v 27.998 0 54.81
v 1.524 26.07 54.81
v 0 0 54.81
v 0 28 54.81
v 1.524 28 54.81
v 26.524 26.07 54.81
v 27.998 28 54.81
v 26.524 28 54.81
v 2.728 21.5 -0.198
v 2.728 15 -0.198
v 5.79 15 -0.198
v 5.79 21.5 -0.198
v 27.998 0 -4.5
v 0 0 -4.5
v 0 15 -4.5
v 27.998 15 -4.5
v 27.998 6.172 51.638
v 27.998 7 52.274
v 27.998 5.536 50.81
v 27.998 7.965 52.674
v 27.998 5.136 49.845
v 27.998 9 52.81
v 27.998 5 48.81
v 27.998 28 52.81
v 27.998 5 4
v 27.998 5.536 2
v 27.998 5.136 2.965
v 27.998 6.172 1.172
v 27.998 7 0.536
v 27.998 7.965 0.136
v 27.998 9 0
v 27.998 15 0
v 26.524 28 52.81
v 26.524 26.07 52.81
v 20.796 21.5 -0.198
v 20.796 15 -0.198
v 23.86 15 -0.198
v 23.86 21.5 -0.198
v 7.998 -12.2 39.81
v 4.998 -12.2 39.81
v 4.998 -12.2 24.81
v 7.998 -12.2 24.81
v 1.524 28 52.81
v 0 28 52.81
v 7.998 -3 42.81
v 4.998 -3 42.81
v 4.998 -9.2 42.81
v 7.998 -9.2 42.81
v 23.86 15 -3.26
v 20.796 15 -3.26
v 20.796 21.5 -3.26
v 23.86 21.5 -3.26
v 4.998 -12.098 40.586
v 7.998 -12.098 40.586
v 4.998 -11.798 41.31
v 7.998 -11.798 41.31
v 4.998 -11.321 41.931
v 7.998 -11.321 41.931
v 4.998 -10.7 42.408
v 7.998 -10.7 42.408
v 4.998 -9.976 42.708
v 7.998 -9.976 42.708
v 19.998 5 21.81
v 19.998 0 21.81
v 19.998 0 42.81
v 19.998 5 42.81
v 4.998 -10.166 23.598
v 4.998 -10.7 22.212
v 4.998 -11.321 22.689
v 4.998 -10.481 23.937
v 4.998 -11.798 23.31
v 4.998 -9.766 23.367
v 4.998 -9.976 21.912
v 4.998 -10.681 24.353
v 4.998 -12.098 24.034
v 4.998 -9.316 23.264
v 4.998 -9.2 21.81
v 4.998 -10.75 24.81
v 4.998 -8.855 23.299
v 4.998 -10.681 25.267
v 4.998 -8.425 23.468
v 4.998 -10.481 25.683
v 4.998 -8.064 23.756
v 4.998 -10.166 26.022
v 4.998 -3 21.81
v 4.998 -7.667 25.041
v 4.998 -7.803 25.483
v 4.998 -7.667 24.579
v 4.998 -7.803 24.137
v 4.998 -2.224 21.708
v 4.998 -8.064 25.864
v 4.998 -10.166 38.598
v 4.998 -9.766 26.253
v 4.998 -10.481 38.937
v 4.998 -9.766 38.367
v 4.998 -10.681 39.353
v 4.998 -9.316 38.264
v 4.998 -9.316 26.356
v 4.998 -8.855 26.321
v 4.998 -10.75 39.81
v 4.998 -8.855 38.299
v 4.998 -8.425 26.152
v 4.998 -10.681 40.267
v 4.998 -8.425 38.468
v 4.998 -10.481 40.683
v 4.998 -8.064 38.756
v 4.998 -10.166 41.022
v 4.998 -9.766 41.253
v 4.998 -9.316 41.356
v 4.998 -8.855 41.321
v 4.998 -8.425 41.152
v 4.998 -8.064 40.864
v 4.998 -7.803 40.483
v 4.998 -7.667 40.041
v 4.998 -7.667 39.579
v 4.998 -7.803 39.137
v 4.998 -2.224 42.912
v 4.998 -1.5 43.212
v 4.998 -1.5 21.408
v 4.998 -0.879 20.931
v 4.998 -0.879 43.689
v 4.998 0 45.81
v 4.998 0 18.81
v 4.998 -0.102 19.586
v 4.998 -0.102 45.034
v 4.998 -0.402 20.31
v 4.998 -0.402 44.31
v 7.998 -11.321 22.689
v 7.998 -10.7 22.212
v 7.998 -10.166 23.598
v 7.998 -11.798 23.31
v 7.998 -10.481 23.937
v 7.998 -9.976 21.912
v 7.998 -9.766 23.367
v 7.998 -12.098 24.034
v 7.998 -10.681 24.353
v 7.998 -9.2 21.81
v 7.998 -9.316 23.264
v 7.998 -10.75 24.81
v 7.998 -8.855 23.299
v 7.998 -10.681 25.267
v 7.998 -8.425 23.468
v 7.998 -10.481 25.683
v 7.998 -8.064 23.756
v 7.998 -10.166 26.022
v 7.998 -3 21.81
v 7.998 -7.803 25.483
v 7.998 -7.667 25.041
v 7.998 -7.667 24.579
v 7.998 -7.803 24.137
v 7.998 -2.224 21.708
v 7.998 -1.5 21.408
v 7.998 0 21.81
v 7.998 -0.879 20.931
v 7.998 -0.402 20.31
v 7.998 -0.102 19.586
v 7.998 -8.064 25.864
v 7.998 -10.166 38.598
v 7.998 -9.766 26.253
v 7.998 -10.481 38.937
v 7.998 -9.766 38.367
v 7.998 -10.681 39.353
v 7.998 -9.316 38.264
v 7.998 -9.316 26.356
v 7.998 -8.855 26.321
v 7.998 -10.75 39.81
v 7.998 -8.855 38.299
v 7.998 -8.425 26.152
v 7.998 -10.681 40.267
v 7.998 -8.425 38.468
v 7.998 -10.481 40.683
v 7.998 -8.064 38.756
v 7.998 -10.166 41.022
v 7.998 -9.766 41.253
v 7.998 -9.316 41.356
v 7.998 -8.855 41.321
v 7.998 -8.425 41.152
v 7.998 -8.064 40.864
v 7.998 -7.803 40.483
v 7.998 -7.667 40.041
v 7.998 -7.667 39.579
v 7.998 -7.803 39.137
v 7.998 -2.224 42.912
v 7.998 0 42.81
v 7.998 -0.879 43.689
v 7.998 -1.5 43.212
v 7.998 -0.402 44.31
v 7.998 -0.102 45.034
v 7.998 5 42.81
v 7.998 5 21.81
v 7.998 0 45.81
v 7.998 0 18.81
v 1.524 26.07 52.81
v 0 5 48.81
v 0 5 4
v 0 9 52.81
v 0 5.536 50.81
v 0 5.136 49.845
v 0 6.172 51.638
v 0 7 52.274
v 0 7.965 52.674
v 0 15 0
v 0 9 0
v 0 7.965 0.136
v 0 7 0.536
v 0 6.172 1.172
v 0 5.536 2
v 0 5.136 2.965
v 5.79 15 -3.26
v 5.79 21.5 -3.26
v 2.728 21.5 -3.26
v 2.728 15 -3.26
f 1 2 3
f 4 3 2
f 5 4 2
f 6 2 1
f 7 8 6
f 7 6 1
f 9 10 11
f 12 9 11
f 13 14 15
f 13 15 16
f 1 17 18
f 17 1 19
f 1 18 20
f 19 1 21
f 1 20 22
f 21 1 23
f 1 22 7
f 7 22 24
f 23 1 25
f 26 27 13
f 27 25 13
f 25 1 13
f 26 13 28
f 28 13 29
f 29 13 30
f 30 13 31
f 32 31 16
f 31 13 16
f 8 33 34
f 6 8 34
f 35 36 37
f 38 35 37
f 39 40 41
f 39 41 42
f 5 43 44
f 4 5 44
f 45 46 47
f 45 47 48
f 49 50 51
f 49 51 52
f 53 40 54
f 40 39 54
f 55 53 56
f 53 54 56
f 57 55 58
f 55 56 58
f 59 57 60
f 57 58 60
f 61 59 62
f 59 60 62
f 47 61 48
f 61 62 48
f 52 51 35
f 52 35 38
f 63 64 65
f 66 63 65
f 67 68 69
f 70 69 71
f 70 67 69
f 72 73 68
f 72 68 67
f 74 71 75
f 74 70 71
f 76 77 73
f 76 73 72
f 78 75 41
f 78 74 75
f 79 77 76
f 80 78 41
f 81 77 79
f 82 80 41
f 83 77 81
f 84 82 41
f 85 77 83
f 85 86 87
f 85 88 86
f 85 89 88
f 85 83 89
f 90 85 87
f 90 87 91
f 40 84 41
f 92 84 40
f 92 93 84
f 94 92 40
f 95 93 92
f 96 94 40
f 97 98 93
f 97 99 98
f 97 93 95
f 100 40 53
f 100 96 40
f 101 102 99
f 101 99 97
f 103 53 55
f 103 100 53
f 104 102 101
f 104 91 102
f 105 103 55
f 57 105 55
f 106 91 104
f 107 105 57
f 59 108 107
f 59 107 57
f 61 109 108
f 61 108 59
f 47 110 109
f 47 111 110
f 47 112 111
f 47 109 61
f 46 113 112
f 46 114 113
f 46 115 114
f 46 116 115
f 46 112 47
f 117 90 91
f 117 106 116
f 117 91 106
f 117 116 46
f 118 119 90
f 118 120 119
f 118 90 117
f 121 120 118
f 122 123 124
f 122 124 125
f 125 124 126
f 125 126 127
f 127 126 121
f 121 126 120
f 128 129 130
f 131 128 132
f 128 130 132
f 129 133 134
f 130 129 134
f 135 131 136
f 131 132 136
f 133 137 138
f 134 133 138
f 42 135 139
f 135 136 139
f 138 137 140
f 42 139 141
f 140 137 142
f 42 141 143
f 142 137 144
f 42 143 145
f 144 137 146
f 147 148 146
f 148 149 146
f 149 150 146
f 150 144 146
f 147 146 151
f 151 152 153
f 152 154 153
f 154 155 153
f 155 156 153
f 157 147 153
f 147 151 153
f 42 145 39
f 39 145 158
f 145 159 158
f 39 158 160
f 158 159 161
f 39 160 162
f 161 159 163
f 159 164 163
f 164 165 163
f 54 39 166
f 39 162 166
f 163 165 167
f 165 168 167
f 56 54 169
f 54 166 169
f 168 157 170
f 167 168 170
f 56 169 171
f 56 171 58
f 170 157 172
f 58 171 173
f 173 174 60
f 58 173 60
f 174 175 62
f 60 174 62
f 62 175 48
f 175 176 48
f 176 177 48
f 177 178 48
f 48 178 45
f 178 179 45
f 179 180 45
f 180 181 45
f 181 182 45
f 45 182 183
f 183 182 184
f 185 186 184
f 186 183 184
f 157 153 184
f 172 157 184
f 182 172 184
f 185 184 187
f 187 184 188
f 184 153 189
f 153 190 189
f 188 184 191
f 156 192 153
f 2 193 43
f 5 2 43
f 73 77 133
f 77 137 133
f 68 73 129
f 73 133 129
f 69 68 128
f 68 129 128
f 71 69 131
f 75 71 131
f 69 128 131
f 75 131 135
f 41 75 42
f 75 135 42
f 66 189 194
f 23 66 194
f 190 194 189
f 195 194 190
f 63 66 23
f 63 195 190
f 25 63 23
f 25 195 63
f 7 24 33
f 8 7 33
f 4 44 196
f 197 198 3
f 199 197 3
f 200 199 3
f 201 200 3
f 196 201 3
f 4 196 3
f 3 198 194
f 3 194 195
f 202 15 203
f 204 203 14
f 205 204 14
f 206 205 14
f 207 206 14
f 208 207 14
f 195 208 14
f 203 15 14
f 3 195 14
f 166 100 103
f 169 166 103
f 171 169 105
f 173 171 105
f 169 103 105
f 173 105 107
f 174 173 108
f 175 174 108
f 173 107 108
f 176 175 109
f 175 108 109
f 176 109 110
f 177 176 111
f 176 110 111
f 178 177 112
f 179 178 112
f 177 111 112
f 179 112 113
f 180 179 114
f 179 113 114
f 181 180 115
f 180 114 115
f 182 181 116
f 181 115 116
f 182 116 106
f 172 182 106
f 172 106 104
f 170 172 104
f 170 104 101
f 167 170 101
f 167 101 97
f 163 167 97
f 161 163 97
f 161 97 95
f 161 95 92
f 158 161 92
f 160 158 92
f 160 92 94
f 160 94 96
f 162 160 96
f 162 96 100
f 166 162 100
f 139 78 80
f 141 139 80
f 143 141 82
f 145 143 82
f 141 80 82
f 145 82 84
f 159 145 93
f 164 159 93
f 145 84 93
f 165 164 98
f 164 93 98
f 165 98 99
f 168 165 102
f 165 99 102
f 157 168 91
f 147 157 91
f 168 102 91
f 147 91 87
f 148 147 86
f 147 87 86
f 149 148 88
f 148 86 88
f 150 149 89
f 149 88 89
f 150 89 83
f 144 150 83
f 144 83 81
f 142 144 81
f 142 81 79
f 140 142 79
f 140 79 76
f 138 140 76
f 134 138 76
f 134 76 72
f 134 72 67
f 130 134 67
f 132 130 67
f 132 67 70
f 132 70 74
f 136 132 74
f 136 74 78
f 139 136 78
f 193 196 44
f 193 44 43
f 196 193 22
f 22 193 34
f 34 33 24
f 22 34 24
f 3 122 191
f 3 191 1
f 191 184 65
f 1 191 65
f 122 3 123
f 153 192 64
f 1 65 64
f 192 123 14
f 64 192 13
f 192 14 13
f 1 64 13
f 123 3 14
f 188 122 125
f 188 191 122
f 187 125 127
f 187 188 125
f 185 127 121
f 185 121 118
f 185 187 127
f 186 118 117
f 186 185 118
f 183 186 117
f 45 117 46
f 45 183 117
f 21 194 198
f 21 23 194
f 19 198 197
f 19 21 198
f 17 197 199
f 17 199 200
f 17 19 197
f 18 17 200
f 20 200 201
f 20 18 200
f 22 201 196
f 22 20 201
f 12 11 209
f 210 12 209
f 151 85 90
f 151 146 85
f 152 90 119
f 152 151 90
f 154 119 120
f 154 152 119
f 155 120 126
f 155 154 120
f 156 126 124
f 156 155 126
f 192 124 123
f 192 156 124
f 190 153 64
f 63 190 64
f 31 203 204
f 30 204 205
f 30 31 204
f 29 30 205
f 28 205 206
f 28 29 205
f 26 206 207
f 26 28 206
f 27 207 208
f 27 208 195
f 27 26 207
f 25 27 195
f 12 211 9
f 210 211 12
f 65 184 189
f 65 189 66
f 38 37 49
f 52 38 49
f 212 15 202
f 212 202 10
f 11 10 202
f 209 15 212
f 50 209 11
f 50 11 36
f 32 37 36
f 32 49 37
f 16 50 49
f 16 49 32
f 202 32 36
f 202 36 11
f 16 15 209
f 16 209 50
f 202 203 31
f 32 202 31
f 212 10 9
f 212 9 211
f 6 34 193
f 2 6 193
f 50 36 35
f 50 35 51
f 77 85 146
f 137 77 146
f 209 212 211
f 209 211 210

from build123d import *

# Parameters (mm, degrees)
SKETCH1_W           = 27.99800038
SKETCH1_H           = 4.5
BOSS_EXTRUDE2_DEPTH = 15
SKETCH2_W           = 27.99800038
SKETCH2_H           = 5
BOSS_EXTRUDE3_DEPTH = 52.81000038
FILLET1_R           = 4
SKETCH3_W           = 27.99800038
SKETCH3_H           = 5
BOSS_EXTRUDE4_DEPTH = 2.000000002
FILLET2_R           = 4
SKETCH4_W           = 3.06400013
SKETCH4_H           = 3.062000231
SKETCH4_W_2         = 3.062003374
BOSS_EXTRUDE5_DEPTH = 6.5
SKETCH5_W           = 12
SKETCH5_H           = 21
CUT_EXTRUDE1_DEPTH  = 6.5
SKETCH6_W           = 3
SKETCH6_H           = 21
BOSS_EXTRUDE6_DEPTH = 12.2
CUT_EXTRUDE2_DEPTH  = 12.2
FILLET4_R           = 3
FILLET5_R           = 3


with BuildPart() as part:
    # Sketch1 → Boss-Extrude2 (new body)
    with BuildSketch(Plane(origin=(0, 0, 0), x_dir=(1, 0, 0), z_dir=(0, 1, 0))):
        with Locations((13.99900019, 2.25)):
            Rectangle(SKETCH1_W, SKETCH1_H)
    extrude(amount=BOSS_EXTRUDE2_DEPTH)

    # Sketch2 → Boss-Extrude3 (add)
    with BuildSketch(Plane.XY):
        with Locations((13.99900019, 2.5)):
            Rectangle(SKETCH2_W, SKETCH2_H)
    extrude(amount=BOSS_EXTRUDE3_DEPTH)

    # Fillet1
    fillet1_edges = [part.edges().sort_by_distance(p)[0] for p in [
        (13.99900019, 5, 0),
    ]]
    fillet(fillet1_edges, radius=FILLET1_R)

    # Sketch3 → Boss-Extrude4 (add)
    with BuildSketch(Plane.XY.offset(52.81000038)):
        Polygon((0, 5), (27.99800038, 5), (27.99800038, 28), (26.52400061, 28), (26.52400061, 26.06971172), (1.52400061, 26.06971172), (1.52400061, 28), (0, 28), align=None)
        with Locations((13.99900019, 2.5)):
            Rectangle(SKETCH3_W, SKETCH3_H)
    extrude(amount=BOSS_EXTRUDE4_DEPTH)

    # Fillet2
    fillet2_edges = [part.edges().sort_by_distance(p)[0] for p in [
        (13.99900019, 5, 52.81000038),
    ]]
    fillet(fillet2_edges, radius=FILLET2_R)

    # Sketch4 → Boss-Extrude5 (add)
    with BuildSketch(Plane(origin=(0, 15, 0), x_dir=(1, 0, 0), z_dir=(0, 1, 0))):
        with Locations((22.327996787, 1.728999914)):
            Rectangle(SKETCH4_W, SKETCH4_H)
        with Locations((4.258997735, 1.728999914)):
            Rectangle(SKETCH4_W_2, SKETCH4_H)
    extrude(amount=BOSS_EXTRUDE5_DEPTH)

    # Sketch5 → Cut-Extrude1 (cut)
    with BuildSketch(Plane.XZ):
        with Locations((13.99800038, 32.310000382)):
            Rectangle(SKETCH5_W, SKETCH5_H)
    extrude(amount=-CUT_EXTRUDE1_DEPTH, mode=Mode.SUBTRACT)

    # Sketch6 → Boss-Extrude6 (add)
    with BuildSketch(Plane.XZ):
        with Locations((6.49800038, 32.310000382)):
            Rectangle(SKETCH6_W, SKETCH6_H)
    extrude(amount=BOSS_EXTRUDE6_DEPTH)

    # Sketch7 → Cut-Extrude2 (cut)
    with BuildSketch(Plane.ZY.offset(-4.99800038)):
        with BuildLine():
            ThreePointArc((24.810000382, -7.65), (23.260000382, -9.2), (24.810000382, -10.75))
            ThreePointArc((24.810000382, -10.75), (26.360000382, -9.2), (24.810000382, -7.65))
        make_face()
        with BuildLine():
            ThreePointArc((39.810000382, -7.65), (38.260000382, -9.2), (39.810000382, -10.75))
            ThreePointArc((39.810000382, -10.75), (41.360000382, -9.2), (39.810000382, -7.65))
        make_face()
    extrude(amount=-CUT_EXTRUDE2_DEPTH, mode=Mode.SUBTRACT)

    # Fillet4
    fillet4_edges = [part.edges().sort_by_distance(p)[0] for p in [
        (6.49800038, -12.2, 42.810000382),
        (6.49800038, -12.2, 21.810000382),
    ]]
    fillet(fillet4_edges, radius=FILLET4_R)

    # Fillet5
    fillet5_edges = [part.edges().sort_by_distance(p)[0] for p in [
        (6.49800038, 0, 42.810000382),
        (6.49800038, 0, 21.810000382),
    ]]
    fillet(fillet5_edges, radius=FILLET5_R)


solid = part.part
